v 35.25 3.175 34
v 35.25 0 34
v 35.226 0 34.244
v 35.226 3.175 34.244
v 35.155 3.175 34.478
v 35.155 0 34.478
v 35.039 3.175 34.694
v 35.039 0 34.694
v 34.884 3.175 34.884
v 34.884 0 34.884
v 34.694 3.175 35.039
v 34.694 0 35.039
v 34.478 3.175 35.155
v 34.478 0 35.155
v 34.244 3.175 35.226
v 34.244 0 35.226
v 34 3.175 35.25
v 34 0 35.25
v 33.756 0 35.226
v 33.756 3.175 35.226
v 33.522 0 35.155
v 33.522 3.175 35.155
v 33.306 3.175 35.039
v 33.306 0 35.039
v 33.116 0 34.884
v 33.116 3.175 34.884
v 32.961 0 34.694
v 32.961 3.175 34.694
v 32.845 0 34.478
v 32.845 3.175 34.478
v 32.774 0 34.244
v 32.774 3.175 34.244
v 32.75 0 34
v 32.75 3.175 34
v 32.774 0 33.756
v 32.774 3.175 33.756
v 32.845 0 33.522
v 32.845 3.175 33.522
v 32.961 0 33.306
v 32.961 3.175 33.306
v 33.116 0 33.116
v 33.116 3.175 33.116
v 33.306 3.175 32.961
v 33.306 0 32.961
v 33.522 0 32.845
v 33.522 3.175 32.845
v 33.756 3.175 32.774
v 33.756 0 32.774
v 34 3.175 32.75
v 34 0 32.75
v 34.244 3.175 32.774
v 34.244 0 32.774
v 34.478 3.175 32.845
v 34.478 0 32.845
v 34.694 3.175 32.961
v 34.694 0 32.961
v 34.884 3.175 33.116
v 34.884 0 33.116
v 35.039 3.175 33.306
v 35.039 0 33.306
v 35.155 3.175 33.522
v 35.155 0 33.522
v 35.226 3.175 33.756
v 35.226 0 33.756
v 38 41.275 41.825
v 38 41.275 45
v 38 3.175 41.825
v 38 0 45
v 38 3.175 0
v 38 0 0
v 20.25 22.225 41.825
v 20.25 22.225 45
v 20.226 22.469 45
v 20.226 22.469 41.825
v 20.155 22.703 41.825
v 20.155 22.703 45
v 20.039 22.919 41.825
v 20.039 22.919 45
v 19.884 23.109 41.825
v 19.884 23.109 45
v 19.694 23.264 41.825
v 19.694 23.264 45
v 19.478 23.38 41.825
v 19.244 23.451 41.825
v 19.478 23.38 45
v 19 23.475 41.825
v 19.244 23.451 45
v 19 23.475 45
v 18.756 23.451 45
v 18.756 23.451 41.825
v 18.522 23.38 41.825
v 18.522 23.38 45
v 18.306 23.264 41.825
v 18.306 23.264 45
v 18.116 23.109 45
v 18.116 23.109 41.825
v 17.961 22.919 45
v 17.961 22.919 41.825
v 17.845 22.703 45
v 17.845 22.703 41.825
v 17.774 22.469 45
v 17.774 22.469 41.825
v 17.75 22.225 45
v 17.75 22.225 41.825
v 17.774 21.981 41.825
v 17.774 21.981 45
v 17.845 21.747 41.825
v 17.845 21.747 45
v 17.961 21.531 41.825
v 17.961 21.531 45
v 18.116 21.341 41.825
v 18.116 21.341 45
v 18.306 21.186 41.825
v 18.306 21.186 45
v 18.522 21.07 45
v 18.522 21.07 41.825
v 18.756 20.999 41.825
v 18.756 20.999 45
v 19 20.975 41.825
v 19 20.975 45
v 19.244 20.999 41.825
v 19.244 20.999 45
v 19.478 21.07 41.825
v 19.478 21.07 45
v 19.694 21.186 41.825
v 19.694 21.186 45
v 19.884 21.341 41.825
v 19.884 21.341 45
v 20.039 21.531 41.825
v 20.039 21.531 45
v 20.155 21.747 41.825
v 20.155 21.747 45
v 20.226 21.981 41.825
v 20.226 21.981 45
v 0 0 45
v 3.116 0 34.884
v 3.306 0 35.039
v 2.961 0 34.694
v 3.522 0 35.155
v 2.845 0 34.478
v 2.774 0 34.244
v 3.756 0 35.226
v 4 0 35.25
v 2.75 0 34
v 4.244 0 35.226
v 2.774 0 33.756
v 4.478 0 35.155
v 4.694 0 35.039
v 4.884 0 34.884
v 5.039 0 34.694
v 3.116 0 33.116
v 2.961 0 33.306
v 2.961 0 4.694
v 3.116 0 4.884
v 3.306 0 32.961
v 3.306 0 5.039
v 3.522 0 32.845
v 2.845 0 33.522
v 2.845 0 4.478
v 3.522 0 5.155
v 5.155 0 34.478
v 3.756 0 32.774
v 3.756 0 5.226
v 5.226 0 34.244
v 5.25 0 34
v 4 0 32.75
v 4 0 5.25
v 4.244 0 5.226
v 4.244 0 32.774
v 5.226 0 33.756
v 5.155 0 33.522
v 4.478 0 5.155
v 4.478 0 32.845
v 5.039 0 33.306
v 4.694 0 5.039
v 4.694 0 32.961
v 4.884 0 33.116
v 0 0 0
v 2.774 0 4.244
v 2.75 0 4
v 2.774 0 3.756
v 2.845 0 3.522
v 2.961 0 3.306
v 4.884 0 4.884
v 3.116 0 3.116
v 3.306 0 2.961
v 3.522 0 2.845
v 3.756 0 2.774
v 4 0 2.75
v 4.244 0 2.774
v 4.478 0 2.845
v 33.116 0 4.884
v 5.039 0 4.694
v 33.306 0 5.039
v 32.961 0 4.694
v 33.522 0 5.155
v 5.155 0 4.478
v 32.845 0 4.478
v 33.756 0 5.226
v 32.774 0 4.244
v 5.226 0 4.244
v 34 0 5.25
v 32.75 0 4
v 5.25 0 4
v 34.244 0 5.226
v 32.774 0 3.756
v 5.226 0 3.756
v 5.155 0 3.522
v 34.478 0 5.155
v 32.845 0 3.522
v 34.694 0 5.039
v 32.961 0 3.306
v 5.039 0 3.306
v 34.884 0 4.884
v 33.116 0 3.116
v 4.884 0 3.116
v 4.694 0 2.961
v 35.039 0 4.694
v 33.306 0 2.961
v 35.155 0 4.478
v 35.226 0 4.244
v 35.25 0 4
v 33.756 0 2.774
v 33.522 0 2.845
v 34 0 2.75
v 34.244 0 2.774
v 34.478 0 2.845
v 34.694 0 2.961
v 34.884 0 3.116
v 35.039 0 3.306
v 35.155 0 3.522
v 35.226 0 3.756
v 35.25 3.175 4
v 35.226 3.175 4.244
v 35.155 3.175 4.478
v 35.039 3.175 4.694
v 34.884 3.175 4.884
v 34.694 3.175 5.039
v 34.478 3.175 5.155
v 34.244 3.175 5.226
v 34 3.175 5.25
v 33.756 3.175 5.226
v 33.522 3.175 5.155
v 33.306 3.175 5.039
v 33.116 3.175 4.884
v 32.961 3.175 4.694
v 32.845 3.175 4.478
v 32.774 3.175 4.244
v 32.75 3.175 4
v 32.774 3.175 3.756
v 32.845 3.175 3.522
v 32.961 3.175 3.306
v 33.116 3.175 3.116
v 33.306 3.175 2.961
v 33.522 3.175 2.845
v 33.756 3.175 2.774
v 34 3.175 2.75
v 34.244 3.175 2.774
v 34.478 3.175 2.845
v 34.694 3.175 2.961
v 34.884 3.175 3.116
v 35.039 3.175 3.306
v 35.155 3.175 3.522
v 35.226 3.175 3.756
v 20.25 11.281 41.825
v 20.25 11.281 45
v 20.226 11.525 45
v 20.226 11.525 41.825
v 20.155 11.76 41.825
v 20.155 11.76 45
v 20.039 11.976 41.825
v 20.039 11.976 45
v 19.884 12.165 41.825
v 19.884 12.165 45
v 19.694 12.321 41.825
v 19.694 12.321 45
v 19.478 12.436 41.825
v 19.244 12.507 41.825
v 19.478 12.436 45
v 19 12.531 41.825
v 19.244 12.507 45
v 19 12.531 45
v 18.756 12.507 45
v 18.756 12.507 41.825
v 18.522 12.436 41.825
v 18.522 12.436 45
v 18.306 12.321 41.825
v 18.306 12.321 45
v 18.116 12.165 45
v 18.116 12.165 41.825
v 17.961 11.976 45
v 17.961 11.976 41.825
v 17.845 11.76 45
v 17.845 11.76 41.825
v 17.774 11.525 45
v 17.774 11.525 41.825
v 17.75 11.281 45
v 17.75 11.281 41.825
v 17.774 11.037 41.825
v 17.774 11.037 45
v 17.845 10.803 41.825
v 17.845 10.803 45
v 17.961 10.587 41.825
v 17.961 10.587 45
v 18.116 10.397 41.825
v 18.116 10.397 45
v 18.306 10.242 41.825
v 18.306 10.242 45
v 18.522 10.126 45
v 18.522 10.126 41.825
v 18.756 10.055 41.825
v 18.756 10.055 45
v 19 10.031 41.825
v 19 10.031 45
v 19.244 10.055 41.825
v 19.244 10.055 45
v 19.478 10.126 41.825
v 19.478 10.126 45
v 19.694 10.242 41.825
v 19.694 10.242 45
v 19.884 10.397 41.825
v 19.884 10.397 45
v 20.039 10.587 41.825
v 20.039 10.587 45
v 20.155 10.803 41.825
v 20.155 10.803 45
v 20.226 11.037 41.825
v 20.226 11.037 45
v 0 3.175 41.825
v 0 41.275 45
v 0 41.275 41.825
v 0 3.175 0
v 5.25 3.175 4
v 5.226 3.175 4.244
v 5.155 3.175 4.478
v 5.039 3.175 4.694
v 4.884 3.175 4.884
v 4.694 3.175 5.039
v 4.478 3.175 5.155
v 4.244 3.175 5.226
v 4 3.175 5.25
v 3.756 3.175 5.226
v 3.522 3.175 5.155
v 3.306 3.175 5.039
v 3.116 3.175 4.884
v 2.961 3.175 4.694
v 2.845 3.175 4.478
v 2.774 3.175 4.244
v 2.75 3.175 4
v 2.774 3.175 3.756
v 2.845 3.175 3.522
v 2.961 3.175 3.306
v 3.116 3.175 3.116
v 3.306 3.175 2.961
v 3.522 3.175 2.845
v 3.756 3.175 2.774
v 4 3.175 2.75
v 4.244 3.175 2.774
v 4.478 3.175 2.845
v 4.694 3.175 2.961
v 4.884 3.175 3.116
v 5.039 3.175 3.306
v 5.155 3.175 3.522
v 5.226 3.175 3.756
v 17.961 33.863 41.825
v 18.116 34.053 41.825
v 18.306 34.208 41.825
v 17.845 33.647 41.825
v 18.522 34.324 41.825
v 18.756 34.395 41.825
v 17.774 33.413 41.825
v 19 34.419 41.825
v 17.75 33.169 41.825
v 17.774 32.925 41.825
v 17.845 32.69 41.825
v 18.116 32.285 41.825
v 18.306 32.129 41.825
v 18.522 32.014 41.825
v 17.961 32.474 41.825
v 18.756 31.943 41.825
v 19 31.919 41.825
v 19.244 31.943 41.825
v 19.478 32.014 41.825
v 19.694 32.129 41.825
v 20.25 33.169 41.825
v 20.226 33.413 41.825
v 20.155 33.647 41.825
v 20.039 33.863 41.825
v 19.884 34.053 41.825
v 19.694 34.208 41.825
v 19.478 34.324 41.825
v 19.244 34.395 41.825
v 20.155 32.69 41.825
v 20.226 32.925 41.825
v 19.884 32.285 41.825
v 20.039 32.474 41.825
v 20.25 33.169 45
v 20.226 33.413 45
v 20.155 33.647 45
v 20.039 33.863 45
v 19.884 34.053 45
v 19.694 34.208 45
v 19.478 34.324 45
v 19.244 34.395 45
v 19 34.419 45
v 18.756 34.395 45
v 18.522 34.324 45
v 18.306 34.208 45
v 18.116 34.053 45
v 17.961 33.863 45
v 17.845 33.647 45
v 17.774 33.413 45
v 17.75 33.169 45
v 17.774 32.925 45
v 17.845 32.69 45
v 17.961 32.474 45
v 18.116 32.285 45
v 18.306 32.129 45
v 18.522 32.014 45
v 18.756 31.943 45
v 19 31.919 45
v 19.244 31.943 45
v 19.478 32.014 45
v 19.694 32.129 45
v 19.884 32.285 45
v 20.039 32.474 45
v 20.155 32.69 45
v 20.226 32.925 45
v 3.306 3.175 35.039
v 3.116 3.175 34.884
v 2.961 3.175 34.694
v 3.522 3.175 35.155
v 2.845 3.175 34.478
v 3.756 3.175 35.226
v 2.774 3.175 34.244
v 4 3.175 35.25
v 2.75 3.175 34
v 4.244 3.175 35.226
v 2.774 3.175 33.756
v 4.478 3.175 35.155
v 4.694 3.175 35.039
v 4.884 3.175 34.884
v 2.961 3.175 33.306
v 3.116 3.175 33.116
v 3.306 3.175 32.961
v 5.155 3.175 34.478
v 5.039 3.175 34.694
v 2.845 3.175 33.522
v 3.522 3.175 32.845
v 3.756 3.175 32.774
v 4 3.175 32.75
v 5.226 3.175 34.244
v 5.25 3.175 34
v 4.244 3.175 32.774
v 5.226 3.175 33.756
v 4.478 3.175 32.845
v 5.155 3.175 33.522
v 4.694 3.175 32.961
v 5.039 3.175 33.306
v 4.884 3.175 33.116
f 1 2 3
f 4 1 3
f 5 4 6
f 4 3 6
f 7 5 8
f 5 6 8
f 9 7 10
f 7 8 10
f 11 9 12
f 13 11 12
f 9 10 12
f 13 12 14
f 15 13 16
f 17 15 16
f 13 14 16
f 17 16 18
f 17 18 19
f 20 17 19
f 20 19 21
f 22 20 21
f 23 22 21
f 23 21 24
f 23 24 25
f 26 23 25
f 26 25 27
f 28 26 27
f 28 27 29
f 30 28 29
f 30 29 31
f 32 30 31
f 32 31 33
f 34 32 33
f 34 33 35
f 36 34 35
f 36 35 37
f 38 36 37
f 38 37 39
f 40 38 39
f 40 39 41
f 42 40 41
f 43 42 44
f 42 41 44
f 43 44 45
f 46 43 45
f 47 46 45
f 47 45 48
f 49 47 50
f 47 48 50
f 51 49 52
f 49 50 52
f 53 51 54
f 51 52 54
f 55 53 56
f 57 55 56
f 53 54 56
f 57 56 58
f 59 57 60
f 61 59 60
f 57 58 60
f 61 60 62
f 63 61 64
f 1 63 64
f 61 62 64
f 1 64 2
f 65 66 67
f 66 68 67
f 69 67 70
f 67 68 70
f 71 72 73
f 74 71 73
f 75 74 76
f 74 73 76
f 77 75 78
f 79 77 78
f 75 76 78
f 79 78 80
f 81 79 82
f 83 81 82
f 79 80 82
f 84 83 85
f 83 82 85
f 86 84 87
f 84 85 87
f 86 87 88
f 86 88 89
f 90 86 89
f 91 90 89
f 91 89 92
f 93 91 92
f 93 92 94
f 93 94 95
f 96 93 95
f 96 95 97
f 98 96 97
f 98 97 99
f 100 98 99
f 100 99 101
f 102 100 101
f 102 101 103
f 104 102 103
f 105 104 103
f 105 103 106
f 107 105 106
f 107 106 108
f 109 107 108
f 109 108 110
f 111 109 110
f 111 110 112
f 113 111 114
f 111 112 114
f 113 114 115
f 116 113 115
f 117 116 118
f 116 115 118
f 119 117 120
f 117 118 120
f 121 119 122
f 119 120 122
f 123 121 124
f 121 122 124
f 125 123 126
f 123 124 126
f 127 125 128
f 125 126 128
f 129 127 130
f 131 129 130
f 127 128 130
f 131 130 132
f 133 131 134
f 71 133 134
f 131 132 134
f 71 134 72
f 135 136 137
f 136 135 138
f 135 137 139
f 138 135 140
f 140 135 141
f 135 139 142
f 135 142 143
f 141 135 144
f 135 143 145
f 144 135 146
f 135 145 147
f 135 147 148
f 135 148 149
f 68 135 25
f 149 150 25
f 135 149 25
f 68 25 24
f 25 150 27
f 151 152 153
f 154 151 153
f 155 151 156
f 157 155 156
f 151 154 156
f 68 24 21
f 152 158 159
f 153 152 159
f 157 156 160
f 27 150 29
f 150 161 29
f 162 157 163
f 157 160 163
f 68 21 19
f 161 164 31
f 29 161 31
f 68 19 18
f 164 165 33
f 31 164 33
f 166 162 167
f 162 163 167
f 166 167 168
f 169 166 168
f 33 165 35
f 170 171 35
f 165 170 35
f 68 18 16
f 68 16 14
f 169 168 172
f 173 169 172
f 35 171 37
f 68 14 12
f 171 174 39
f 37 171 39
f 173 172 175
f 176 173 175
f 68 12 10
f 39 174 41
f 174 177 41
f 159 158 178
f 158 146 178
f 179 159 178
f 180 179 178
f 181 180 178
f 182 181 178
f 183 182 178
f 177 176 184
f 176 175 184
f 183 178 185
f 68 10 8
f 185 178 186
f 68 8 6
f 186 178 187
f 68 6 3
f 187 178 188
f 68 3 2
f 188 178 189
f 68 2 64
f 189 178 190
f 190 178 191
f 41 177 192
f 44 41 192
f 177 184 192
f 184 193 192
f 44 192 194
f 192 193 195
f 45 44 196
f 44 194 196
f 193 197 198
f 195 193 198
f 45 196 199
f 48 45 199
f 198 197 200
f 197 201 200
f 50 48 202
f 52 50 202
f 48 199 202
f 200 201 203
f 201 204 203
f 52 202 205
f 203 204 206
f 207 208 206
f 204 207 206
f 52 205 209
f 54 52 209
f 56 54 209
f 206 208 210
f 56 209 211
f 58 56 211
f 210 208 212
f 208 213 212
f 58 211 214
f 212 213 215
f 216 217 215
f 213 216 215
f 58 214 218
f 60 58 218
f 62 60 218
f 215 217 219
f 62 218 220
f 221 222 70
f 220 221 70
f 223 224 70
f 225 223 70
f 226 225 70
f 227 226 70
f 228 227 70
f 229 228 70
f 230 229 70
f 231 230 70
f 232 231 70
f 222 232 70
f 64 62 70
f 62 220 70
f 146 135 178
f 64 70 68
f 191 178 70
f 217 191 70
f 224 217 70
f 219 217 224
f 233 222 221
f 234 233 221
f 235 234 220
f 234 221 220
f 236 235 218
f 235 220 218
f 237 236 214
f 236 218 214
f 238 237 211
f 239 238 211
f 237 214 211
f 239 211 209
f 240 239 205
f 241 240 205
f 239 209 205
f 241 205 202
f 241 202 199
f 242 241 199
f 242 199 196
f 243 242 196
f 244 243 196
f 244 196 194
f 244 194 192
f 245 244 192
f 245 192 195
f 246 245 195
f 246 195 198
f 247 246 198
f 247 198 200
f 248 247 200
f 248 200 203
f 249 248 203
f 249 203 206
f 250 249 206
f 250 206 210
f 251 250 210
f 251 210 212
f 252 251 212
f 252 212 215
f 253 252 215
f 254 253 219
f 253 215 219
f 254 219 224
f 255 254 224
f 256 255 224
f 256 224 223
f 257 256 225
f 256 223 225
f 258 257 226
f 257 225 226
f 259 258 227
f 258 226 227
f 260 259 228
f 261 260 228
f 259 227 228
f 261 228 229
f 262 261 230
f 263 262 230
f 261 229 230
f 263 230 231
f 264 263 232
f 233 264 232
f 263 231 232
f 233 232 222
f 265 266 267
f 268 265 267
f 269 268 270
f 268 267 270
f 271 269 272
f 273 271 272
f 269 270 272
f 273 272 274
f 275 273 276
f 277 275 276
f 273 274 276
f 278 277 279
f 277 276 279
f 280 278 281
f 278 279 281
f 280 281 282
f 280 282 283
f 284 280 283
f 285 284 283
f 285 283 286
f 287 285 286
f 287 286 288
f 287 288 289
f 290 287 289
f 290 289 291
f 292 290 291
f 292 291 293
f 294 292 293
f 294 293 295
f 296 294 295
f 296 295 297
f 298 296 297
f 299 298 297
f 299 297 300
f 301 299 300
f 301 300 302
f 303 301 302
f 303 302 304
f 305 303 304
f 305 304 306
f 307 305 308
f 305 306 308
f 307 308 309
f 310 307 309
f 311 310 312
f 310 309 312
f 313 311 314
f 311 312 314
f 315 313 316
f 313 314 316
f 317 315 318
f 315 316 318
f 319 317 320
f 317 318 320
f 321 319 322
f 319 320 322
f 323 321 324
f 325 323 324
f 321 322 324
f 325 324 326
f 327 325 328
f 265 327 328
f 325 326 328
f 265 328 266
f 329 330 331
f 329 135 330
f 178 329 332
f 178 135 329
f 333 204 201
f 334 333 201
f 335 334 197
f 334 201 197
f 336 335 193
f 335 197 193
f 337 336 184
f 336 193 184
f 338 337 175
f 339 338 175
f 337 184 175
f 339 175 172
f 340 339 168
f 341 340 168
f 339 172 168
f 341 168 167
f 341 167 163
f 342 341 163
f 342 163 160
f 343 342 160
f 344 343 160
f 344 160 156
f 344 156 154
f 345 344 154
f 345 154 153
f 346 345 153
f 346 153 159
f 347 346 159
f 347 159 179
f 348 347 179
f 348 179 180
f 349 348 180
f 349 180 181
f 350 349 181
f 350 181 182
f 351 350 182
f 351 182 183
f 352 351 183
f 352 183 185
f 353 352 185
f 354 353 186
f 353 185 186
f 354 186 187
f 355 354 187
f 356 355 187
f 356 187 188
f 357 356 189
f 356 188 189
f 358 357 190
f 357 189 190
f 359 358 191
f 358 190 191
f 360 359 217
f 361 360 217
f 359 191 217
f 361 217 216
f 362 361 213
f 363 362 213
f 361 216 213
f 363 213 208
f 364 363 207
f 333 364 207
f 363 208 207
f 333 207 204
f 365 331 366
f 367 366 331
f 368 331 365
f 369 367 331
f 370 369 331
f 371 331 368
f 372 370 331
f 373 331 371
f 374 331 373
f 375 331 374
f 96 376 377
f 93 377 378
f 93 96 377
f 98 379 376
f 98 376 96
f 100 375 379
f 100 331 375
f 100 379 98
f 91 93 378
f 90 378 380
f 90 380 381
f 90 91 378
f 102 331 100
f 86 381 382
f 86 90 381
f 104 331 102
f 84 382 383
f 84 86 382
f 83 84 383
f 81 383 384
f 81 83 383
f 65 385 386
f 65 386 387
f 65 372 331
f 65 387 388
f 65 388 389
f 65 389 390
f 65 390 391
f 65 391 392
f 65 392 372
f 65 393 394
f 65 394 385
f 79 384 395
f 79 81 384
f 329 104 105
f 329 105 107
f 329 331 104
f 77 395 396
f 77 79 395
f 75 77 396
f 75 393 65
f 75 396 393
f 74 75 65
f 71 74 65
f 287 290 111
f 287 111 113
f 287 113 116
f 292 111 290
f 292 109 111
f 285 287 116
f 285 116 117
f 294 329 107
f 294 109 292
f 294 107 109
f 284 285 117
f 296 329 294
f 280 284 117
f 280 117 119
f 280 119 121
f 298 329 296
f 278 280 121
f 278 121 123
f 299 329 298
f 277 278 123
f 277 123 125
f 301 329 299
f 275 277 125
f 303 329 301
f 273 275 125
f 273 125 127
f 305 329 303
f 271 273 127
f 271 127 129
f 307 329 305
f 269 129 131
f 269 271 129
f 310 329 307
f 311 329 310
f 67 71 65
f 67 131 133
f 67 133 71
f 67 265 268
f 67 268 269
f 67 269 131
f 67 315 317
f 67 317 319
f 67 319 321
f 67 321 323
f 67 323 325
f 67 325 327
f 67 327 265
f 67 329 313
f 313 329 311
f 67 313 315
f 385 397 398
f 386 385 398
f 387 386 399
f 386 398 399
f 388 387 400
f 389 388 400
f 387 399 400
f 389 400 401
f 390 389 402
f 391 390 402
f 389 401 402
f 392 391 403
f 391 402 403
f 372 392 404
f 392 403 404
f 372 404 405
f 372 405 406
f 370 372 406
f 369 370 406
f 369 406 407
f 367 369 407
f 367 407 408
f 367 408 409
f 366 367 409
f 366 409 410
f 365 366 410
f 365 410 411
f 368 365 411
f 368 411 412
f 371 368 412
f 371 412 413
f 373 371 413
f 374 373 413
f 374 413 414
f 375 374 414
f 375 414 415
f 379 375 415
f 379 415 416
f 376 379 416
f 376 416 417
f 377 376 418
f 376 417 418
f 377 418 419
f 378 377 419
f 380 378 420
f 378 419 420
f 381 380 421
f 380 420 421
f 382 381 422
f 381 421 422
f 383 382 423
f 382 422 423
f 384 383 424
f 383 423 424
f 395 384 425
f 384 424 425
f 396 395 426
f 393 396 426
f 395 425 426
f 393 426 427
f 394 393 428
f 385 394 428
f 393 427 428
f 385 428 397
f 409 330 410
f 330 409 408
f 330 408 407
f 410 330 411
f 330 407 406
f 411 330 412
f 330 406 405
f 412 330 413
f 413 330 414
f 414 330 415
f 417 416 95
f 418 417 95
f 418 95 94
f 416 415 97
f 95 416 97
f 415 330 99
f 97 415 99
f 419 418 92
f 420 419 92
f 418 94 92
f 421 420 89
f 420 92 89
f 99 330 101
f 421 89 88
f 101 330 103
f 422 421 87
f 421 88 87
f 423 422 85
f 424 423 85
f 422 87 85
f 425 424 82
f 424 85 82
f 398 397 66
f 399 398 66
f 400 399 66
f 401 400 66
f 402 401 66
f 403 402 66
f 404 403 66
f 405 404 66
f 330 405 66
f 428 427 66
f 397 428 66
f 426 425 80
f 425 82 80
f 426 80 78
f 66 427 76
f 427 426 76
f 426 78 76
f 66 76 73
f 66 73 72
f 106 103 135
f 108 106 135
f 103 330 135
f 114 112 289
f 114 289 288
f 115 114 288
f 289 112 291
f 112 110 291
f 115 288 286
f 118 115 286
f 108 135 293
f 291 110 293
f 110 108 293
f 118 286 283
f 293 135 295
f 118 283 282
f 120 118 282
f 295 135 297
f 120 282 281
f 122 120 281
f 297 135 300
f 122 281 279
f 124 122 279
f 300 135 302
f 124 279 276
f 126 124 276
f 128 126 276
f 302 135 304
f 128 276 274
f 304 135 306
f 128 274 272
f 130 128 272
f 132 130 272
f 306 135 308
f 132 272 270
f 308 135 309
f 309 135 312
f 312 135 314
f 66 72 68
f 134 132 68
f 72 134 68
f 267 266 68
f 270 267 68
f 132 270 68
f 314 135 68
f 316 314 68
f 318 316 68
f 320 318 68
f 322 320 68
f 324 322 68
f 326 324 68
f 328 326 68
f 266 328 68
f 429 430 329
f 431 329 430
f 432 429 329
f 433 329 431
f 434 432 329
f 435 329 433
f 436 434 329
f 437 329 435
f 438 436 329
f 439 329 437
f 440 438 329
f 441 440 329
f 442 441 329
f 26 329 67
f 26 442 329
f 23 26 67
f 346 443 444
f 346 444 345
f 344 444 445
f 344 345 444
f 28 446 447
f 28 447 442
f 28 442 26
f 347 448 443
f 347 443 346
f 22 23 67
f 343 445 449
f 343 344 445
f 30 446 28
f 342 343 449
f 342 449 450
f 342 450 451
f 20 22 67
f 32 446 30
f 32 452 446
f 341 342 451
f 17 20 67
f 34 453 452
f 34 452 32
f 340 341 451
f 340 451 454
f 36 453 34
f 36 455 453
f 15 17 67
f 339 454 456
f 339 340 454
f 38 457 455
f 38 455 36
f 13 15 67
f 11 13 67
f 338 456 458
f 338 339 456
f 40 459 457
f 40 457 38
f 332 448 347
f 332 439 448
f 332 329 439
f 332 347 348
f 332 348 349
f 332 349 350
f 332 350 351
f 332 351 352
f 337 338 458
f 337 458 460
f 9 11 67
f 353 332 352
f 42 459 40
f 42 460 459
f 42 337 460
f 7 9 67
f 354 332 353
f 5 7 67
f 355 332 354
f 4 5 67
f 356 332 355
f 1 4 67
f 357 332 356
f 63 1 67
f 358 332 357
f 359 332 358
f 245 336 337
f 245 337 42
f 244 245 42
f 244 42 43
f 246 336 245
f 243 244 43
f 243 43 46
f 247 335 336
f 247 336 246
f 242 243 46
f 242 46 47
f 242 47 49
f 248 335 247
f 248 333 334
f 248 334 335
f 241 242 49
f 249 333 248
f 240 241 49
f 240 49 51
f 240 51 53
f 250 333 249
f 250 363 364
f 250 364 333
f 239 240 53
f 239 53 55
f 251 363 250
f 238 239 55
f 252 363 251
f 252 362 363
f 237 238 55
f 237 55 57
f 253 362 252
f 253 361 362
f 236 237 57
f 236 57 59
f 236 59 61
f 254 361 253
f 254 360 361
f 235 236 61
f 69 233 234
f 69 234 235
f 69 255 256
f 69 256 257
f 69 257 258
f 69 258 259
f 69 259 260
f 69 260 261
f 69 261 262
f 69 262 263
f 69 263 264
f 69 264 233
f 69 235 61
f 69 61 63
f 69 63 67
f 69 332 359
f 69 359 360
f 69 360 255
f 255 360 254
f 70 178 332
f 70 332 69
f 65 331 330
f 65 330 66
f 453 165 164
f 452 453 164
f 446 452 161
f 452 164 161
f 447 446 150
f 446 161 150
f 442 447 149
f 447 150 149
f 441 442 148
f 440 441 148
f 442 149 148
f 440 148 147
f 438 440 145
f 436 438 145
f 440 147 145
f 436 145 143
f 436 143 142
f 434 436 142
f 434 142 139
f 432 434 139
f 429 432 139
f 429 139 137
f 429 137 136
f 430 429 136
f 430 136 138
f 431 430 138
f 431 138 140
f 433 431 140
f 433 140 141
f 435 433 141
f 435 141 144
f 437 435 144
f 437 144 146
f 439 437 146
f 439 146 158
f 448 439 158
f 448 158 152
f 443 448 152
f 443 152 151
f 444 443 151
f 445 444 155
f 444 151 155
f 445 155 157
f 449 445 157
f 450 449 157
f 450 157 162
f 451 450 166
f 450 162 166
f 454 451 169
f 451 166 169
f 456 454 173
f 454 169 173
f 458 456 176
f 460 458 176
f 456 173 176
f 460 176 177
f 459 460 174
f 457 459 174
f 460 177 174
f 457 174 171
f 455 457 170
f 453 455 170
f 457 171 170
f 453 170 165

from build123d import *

# Parameters (mm, degrees)
SKETCH1_W            = 38
SKETCH1_H            = 45
BOSS_EXTRUDE1_DEPTH  = 3.175
SKETCH2_W            = 38
SKETCH2_H            = 3.175
BOSS_EXTRUDE2_DEPTH  = 38.1
SKETCH3_R            = 1.25
CAMERA_HOLES_DEPTH   = 10
SKETCH4_R            = 1.25
MOUNTING_HOLES_DEPTH = 10


with BuildPart() as part:
    # Sketch1 → Boss-Extrude1 (new body)
    with BuildSketch(Plane(origin=(0, 0, 0), x_dir=(1, 0, 0), z_dir=(0, 1, 0))):
        with Locations((19, -22.5)):
            Rectangle(SKETCH1_W, SKETCH1_H)
    extrude(amount=BOSS_EXTRUDE1_DEPTH)

    # Sketch2 → Boss-Extrude2 (add)
    with BuildSketch(Plane(origin=(0, 3.175, 0), x_dir=(1, 0, 0), z_dir=(0, 1, 0))):
        with Locations((19, -43.4125)):
            Rectangle(SKETCH2_W, SKETCH2_H)
    extrude(amount=BOSS_EXTRUDE2_DEPTH)

    # Sketch3 → camera holes (cut)
    with BuildSketch(Plane.XZ):
        with Locations((4, 34)):
            Circle(SKETCH3_R)
        with Locations((34, 34)):
            Circle(SKETCH3_R)
        with Locations((4, 4)):
            Circle(SKETCH3_R)
        with Locations((34, 4)):
            Circle(SKETCH3_R)
    extrude(amount=-CAMERA_HOLES_DEPTH, mode=Mode.SUBTRACT)

    # Sketch4 → mounting holes (cut)
    with BuildSketch(Plane.XY.offset(45)):
        with Locations((19, 11.28125)):
            Circle(SKETCH4_R)
        with Locations((19, 33.16875)):
            Circle(SKETCH4_R)
        with Locations((19, 22.225)):
            Circle(SKETCH4_R)
    extrude(amount=-MOUNTING_HOLES_DEPTH, mode=Mode.SUBTRACT)


solid = part.part
